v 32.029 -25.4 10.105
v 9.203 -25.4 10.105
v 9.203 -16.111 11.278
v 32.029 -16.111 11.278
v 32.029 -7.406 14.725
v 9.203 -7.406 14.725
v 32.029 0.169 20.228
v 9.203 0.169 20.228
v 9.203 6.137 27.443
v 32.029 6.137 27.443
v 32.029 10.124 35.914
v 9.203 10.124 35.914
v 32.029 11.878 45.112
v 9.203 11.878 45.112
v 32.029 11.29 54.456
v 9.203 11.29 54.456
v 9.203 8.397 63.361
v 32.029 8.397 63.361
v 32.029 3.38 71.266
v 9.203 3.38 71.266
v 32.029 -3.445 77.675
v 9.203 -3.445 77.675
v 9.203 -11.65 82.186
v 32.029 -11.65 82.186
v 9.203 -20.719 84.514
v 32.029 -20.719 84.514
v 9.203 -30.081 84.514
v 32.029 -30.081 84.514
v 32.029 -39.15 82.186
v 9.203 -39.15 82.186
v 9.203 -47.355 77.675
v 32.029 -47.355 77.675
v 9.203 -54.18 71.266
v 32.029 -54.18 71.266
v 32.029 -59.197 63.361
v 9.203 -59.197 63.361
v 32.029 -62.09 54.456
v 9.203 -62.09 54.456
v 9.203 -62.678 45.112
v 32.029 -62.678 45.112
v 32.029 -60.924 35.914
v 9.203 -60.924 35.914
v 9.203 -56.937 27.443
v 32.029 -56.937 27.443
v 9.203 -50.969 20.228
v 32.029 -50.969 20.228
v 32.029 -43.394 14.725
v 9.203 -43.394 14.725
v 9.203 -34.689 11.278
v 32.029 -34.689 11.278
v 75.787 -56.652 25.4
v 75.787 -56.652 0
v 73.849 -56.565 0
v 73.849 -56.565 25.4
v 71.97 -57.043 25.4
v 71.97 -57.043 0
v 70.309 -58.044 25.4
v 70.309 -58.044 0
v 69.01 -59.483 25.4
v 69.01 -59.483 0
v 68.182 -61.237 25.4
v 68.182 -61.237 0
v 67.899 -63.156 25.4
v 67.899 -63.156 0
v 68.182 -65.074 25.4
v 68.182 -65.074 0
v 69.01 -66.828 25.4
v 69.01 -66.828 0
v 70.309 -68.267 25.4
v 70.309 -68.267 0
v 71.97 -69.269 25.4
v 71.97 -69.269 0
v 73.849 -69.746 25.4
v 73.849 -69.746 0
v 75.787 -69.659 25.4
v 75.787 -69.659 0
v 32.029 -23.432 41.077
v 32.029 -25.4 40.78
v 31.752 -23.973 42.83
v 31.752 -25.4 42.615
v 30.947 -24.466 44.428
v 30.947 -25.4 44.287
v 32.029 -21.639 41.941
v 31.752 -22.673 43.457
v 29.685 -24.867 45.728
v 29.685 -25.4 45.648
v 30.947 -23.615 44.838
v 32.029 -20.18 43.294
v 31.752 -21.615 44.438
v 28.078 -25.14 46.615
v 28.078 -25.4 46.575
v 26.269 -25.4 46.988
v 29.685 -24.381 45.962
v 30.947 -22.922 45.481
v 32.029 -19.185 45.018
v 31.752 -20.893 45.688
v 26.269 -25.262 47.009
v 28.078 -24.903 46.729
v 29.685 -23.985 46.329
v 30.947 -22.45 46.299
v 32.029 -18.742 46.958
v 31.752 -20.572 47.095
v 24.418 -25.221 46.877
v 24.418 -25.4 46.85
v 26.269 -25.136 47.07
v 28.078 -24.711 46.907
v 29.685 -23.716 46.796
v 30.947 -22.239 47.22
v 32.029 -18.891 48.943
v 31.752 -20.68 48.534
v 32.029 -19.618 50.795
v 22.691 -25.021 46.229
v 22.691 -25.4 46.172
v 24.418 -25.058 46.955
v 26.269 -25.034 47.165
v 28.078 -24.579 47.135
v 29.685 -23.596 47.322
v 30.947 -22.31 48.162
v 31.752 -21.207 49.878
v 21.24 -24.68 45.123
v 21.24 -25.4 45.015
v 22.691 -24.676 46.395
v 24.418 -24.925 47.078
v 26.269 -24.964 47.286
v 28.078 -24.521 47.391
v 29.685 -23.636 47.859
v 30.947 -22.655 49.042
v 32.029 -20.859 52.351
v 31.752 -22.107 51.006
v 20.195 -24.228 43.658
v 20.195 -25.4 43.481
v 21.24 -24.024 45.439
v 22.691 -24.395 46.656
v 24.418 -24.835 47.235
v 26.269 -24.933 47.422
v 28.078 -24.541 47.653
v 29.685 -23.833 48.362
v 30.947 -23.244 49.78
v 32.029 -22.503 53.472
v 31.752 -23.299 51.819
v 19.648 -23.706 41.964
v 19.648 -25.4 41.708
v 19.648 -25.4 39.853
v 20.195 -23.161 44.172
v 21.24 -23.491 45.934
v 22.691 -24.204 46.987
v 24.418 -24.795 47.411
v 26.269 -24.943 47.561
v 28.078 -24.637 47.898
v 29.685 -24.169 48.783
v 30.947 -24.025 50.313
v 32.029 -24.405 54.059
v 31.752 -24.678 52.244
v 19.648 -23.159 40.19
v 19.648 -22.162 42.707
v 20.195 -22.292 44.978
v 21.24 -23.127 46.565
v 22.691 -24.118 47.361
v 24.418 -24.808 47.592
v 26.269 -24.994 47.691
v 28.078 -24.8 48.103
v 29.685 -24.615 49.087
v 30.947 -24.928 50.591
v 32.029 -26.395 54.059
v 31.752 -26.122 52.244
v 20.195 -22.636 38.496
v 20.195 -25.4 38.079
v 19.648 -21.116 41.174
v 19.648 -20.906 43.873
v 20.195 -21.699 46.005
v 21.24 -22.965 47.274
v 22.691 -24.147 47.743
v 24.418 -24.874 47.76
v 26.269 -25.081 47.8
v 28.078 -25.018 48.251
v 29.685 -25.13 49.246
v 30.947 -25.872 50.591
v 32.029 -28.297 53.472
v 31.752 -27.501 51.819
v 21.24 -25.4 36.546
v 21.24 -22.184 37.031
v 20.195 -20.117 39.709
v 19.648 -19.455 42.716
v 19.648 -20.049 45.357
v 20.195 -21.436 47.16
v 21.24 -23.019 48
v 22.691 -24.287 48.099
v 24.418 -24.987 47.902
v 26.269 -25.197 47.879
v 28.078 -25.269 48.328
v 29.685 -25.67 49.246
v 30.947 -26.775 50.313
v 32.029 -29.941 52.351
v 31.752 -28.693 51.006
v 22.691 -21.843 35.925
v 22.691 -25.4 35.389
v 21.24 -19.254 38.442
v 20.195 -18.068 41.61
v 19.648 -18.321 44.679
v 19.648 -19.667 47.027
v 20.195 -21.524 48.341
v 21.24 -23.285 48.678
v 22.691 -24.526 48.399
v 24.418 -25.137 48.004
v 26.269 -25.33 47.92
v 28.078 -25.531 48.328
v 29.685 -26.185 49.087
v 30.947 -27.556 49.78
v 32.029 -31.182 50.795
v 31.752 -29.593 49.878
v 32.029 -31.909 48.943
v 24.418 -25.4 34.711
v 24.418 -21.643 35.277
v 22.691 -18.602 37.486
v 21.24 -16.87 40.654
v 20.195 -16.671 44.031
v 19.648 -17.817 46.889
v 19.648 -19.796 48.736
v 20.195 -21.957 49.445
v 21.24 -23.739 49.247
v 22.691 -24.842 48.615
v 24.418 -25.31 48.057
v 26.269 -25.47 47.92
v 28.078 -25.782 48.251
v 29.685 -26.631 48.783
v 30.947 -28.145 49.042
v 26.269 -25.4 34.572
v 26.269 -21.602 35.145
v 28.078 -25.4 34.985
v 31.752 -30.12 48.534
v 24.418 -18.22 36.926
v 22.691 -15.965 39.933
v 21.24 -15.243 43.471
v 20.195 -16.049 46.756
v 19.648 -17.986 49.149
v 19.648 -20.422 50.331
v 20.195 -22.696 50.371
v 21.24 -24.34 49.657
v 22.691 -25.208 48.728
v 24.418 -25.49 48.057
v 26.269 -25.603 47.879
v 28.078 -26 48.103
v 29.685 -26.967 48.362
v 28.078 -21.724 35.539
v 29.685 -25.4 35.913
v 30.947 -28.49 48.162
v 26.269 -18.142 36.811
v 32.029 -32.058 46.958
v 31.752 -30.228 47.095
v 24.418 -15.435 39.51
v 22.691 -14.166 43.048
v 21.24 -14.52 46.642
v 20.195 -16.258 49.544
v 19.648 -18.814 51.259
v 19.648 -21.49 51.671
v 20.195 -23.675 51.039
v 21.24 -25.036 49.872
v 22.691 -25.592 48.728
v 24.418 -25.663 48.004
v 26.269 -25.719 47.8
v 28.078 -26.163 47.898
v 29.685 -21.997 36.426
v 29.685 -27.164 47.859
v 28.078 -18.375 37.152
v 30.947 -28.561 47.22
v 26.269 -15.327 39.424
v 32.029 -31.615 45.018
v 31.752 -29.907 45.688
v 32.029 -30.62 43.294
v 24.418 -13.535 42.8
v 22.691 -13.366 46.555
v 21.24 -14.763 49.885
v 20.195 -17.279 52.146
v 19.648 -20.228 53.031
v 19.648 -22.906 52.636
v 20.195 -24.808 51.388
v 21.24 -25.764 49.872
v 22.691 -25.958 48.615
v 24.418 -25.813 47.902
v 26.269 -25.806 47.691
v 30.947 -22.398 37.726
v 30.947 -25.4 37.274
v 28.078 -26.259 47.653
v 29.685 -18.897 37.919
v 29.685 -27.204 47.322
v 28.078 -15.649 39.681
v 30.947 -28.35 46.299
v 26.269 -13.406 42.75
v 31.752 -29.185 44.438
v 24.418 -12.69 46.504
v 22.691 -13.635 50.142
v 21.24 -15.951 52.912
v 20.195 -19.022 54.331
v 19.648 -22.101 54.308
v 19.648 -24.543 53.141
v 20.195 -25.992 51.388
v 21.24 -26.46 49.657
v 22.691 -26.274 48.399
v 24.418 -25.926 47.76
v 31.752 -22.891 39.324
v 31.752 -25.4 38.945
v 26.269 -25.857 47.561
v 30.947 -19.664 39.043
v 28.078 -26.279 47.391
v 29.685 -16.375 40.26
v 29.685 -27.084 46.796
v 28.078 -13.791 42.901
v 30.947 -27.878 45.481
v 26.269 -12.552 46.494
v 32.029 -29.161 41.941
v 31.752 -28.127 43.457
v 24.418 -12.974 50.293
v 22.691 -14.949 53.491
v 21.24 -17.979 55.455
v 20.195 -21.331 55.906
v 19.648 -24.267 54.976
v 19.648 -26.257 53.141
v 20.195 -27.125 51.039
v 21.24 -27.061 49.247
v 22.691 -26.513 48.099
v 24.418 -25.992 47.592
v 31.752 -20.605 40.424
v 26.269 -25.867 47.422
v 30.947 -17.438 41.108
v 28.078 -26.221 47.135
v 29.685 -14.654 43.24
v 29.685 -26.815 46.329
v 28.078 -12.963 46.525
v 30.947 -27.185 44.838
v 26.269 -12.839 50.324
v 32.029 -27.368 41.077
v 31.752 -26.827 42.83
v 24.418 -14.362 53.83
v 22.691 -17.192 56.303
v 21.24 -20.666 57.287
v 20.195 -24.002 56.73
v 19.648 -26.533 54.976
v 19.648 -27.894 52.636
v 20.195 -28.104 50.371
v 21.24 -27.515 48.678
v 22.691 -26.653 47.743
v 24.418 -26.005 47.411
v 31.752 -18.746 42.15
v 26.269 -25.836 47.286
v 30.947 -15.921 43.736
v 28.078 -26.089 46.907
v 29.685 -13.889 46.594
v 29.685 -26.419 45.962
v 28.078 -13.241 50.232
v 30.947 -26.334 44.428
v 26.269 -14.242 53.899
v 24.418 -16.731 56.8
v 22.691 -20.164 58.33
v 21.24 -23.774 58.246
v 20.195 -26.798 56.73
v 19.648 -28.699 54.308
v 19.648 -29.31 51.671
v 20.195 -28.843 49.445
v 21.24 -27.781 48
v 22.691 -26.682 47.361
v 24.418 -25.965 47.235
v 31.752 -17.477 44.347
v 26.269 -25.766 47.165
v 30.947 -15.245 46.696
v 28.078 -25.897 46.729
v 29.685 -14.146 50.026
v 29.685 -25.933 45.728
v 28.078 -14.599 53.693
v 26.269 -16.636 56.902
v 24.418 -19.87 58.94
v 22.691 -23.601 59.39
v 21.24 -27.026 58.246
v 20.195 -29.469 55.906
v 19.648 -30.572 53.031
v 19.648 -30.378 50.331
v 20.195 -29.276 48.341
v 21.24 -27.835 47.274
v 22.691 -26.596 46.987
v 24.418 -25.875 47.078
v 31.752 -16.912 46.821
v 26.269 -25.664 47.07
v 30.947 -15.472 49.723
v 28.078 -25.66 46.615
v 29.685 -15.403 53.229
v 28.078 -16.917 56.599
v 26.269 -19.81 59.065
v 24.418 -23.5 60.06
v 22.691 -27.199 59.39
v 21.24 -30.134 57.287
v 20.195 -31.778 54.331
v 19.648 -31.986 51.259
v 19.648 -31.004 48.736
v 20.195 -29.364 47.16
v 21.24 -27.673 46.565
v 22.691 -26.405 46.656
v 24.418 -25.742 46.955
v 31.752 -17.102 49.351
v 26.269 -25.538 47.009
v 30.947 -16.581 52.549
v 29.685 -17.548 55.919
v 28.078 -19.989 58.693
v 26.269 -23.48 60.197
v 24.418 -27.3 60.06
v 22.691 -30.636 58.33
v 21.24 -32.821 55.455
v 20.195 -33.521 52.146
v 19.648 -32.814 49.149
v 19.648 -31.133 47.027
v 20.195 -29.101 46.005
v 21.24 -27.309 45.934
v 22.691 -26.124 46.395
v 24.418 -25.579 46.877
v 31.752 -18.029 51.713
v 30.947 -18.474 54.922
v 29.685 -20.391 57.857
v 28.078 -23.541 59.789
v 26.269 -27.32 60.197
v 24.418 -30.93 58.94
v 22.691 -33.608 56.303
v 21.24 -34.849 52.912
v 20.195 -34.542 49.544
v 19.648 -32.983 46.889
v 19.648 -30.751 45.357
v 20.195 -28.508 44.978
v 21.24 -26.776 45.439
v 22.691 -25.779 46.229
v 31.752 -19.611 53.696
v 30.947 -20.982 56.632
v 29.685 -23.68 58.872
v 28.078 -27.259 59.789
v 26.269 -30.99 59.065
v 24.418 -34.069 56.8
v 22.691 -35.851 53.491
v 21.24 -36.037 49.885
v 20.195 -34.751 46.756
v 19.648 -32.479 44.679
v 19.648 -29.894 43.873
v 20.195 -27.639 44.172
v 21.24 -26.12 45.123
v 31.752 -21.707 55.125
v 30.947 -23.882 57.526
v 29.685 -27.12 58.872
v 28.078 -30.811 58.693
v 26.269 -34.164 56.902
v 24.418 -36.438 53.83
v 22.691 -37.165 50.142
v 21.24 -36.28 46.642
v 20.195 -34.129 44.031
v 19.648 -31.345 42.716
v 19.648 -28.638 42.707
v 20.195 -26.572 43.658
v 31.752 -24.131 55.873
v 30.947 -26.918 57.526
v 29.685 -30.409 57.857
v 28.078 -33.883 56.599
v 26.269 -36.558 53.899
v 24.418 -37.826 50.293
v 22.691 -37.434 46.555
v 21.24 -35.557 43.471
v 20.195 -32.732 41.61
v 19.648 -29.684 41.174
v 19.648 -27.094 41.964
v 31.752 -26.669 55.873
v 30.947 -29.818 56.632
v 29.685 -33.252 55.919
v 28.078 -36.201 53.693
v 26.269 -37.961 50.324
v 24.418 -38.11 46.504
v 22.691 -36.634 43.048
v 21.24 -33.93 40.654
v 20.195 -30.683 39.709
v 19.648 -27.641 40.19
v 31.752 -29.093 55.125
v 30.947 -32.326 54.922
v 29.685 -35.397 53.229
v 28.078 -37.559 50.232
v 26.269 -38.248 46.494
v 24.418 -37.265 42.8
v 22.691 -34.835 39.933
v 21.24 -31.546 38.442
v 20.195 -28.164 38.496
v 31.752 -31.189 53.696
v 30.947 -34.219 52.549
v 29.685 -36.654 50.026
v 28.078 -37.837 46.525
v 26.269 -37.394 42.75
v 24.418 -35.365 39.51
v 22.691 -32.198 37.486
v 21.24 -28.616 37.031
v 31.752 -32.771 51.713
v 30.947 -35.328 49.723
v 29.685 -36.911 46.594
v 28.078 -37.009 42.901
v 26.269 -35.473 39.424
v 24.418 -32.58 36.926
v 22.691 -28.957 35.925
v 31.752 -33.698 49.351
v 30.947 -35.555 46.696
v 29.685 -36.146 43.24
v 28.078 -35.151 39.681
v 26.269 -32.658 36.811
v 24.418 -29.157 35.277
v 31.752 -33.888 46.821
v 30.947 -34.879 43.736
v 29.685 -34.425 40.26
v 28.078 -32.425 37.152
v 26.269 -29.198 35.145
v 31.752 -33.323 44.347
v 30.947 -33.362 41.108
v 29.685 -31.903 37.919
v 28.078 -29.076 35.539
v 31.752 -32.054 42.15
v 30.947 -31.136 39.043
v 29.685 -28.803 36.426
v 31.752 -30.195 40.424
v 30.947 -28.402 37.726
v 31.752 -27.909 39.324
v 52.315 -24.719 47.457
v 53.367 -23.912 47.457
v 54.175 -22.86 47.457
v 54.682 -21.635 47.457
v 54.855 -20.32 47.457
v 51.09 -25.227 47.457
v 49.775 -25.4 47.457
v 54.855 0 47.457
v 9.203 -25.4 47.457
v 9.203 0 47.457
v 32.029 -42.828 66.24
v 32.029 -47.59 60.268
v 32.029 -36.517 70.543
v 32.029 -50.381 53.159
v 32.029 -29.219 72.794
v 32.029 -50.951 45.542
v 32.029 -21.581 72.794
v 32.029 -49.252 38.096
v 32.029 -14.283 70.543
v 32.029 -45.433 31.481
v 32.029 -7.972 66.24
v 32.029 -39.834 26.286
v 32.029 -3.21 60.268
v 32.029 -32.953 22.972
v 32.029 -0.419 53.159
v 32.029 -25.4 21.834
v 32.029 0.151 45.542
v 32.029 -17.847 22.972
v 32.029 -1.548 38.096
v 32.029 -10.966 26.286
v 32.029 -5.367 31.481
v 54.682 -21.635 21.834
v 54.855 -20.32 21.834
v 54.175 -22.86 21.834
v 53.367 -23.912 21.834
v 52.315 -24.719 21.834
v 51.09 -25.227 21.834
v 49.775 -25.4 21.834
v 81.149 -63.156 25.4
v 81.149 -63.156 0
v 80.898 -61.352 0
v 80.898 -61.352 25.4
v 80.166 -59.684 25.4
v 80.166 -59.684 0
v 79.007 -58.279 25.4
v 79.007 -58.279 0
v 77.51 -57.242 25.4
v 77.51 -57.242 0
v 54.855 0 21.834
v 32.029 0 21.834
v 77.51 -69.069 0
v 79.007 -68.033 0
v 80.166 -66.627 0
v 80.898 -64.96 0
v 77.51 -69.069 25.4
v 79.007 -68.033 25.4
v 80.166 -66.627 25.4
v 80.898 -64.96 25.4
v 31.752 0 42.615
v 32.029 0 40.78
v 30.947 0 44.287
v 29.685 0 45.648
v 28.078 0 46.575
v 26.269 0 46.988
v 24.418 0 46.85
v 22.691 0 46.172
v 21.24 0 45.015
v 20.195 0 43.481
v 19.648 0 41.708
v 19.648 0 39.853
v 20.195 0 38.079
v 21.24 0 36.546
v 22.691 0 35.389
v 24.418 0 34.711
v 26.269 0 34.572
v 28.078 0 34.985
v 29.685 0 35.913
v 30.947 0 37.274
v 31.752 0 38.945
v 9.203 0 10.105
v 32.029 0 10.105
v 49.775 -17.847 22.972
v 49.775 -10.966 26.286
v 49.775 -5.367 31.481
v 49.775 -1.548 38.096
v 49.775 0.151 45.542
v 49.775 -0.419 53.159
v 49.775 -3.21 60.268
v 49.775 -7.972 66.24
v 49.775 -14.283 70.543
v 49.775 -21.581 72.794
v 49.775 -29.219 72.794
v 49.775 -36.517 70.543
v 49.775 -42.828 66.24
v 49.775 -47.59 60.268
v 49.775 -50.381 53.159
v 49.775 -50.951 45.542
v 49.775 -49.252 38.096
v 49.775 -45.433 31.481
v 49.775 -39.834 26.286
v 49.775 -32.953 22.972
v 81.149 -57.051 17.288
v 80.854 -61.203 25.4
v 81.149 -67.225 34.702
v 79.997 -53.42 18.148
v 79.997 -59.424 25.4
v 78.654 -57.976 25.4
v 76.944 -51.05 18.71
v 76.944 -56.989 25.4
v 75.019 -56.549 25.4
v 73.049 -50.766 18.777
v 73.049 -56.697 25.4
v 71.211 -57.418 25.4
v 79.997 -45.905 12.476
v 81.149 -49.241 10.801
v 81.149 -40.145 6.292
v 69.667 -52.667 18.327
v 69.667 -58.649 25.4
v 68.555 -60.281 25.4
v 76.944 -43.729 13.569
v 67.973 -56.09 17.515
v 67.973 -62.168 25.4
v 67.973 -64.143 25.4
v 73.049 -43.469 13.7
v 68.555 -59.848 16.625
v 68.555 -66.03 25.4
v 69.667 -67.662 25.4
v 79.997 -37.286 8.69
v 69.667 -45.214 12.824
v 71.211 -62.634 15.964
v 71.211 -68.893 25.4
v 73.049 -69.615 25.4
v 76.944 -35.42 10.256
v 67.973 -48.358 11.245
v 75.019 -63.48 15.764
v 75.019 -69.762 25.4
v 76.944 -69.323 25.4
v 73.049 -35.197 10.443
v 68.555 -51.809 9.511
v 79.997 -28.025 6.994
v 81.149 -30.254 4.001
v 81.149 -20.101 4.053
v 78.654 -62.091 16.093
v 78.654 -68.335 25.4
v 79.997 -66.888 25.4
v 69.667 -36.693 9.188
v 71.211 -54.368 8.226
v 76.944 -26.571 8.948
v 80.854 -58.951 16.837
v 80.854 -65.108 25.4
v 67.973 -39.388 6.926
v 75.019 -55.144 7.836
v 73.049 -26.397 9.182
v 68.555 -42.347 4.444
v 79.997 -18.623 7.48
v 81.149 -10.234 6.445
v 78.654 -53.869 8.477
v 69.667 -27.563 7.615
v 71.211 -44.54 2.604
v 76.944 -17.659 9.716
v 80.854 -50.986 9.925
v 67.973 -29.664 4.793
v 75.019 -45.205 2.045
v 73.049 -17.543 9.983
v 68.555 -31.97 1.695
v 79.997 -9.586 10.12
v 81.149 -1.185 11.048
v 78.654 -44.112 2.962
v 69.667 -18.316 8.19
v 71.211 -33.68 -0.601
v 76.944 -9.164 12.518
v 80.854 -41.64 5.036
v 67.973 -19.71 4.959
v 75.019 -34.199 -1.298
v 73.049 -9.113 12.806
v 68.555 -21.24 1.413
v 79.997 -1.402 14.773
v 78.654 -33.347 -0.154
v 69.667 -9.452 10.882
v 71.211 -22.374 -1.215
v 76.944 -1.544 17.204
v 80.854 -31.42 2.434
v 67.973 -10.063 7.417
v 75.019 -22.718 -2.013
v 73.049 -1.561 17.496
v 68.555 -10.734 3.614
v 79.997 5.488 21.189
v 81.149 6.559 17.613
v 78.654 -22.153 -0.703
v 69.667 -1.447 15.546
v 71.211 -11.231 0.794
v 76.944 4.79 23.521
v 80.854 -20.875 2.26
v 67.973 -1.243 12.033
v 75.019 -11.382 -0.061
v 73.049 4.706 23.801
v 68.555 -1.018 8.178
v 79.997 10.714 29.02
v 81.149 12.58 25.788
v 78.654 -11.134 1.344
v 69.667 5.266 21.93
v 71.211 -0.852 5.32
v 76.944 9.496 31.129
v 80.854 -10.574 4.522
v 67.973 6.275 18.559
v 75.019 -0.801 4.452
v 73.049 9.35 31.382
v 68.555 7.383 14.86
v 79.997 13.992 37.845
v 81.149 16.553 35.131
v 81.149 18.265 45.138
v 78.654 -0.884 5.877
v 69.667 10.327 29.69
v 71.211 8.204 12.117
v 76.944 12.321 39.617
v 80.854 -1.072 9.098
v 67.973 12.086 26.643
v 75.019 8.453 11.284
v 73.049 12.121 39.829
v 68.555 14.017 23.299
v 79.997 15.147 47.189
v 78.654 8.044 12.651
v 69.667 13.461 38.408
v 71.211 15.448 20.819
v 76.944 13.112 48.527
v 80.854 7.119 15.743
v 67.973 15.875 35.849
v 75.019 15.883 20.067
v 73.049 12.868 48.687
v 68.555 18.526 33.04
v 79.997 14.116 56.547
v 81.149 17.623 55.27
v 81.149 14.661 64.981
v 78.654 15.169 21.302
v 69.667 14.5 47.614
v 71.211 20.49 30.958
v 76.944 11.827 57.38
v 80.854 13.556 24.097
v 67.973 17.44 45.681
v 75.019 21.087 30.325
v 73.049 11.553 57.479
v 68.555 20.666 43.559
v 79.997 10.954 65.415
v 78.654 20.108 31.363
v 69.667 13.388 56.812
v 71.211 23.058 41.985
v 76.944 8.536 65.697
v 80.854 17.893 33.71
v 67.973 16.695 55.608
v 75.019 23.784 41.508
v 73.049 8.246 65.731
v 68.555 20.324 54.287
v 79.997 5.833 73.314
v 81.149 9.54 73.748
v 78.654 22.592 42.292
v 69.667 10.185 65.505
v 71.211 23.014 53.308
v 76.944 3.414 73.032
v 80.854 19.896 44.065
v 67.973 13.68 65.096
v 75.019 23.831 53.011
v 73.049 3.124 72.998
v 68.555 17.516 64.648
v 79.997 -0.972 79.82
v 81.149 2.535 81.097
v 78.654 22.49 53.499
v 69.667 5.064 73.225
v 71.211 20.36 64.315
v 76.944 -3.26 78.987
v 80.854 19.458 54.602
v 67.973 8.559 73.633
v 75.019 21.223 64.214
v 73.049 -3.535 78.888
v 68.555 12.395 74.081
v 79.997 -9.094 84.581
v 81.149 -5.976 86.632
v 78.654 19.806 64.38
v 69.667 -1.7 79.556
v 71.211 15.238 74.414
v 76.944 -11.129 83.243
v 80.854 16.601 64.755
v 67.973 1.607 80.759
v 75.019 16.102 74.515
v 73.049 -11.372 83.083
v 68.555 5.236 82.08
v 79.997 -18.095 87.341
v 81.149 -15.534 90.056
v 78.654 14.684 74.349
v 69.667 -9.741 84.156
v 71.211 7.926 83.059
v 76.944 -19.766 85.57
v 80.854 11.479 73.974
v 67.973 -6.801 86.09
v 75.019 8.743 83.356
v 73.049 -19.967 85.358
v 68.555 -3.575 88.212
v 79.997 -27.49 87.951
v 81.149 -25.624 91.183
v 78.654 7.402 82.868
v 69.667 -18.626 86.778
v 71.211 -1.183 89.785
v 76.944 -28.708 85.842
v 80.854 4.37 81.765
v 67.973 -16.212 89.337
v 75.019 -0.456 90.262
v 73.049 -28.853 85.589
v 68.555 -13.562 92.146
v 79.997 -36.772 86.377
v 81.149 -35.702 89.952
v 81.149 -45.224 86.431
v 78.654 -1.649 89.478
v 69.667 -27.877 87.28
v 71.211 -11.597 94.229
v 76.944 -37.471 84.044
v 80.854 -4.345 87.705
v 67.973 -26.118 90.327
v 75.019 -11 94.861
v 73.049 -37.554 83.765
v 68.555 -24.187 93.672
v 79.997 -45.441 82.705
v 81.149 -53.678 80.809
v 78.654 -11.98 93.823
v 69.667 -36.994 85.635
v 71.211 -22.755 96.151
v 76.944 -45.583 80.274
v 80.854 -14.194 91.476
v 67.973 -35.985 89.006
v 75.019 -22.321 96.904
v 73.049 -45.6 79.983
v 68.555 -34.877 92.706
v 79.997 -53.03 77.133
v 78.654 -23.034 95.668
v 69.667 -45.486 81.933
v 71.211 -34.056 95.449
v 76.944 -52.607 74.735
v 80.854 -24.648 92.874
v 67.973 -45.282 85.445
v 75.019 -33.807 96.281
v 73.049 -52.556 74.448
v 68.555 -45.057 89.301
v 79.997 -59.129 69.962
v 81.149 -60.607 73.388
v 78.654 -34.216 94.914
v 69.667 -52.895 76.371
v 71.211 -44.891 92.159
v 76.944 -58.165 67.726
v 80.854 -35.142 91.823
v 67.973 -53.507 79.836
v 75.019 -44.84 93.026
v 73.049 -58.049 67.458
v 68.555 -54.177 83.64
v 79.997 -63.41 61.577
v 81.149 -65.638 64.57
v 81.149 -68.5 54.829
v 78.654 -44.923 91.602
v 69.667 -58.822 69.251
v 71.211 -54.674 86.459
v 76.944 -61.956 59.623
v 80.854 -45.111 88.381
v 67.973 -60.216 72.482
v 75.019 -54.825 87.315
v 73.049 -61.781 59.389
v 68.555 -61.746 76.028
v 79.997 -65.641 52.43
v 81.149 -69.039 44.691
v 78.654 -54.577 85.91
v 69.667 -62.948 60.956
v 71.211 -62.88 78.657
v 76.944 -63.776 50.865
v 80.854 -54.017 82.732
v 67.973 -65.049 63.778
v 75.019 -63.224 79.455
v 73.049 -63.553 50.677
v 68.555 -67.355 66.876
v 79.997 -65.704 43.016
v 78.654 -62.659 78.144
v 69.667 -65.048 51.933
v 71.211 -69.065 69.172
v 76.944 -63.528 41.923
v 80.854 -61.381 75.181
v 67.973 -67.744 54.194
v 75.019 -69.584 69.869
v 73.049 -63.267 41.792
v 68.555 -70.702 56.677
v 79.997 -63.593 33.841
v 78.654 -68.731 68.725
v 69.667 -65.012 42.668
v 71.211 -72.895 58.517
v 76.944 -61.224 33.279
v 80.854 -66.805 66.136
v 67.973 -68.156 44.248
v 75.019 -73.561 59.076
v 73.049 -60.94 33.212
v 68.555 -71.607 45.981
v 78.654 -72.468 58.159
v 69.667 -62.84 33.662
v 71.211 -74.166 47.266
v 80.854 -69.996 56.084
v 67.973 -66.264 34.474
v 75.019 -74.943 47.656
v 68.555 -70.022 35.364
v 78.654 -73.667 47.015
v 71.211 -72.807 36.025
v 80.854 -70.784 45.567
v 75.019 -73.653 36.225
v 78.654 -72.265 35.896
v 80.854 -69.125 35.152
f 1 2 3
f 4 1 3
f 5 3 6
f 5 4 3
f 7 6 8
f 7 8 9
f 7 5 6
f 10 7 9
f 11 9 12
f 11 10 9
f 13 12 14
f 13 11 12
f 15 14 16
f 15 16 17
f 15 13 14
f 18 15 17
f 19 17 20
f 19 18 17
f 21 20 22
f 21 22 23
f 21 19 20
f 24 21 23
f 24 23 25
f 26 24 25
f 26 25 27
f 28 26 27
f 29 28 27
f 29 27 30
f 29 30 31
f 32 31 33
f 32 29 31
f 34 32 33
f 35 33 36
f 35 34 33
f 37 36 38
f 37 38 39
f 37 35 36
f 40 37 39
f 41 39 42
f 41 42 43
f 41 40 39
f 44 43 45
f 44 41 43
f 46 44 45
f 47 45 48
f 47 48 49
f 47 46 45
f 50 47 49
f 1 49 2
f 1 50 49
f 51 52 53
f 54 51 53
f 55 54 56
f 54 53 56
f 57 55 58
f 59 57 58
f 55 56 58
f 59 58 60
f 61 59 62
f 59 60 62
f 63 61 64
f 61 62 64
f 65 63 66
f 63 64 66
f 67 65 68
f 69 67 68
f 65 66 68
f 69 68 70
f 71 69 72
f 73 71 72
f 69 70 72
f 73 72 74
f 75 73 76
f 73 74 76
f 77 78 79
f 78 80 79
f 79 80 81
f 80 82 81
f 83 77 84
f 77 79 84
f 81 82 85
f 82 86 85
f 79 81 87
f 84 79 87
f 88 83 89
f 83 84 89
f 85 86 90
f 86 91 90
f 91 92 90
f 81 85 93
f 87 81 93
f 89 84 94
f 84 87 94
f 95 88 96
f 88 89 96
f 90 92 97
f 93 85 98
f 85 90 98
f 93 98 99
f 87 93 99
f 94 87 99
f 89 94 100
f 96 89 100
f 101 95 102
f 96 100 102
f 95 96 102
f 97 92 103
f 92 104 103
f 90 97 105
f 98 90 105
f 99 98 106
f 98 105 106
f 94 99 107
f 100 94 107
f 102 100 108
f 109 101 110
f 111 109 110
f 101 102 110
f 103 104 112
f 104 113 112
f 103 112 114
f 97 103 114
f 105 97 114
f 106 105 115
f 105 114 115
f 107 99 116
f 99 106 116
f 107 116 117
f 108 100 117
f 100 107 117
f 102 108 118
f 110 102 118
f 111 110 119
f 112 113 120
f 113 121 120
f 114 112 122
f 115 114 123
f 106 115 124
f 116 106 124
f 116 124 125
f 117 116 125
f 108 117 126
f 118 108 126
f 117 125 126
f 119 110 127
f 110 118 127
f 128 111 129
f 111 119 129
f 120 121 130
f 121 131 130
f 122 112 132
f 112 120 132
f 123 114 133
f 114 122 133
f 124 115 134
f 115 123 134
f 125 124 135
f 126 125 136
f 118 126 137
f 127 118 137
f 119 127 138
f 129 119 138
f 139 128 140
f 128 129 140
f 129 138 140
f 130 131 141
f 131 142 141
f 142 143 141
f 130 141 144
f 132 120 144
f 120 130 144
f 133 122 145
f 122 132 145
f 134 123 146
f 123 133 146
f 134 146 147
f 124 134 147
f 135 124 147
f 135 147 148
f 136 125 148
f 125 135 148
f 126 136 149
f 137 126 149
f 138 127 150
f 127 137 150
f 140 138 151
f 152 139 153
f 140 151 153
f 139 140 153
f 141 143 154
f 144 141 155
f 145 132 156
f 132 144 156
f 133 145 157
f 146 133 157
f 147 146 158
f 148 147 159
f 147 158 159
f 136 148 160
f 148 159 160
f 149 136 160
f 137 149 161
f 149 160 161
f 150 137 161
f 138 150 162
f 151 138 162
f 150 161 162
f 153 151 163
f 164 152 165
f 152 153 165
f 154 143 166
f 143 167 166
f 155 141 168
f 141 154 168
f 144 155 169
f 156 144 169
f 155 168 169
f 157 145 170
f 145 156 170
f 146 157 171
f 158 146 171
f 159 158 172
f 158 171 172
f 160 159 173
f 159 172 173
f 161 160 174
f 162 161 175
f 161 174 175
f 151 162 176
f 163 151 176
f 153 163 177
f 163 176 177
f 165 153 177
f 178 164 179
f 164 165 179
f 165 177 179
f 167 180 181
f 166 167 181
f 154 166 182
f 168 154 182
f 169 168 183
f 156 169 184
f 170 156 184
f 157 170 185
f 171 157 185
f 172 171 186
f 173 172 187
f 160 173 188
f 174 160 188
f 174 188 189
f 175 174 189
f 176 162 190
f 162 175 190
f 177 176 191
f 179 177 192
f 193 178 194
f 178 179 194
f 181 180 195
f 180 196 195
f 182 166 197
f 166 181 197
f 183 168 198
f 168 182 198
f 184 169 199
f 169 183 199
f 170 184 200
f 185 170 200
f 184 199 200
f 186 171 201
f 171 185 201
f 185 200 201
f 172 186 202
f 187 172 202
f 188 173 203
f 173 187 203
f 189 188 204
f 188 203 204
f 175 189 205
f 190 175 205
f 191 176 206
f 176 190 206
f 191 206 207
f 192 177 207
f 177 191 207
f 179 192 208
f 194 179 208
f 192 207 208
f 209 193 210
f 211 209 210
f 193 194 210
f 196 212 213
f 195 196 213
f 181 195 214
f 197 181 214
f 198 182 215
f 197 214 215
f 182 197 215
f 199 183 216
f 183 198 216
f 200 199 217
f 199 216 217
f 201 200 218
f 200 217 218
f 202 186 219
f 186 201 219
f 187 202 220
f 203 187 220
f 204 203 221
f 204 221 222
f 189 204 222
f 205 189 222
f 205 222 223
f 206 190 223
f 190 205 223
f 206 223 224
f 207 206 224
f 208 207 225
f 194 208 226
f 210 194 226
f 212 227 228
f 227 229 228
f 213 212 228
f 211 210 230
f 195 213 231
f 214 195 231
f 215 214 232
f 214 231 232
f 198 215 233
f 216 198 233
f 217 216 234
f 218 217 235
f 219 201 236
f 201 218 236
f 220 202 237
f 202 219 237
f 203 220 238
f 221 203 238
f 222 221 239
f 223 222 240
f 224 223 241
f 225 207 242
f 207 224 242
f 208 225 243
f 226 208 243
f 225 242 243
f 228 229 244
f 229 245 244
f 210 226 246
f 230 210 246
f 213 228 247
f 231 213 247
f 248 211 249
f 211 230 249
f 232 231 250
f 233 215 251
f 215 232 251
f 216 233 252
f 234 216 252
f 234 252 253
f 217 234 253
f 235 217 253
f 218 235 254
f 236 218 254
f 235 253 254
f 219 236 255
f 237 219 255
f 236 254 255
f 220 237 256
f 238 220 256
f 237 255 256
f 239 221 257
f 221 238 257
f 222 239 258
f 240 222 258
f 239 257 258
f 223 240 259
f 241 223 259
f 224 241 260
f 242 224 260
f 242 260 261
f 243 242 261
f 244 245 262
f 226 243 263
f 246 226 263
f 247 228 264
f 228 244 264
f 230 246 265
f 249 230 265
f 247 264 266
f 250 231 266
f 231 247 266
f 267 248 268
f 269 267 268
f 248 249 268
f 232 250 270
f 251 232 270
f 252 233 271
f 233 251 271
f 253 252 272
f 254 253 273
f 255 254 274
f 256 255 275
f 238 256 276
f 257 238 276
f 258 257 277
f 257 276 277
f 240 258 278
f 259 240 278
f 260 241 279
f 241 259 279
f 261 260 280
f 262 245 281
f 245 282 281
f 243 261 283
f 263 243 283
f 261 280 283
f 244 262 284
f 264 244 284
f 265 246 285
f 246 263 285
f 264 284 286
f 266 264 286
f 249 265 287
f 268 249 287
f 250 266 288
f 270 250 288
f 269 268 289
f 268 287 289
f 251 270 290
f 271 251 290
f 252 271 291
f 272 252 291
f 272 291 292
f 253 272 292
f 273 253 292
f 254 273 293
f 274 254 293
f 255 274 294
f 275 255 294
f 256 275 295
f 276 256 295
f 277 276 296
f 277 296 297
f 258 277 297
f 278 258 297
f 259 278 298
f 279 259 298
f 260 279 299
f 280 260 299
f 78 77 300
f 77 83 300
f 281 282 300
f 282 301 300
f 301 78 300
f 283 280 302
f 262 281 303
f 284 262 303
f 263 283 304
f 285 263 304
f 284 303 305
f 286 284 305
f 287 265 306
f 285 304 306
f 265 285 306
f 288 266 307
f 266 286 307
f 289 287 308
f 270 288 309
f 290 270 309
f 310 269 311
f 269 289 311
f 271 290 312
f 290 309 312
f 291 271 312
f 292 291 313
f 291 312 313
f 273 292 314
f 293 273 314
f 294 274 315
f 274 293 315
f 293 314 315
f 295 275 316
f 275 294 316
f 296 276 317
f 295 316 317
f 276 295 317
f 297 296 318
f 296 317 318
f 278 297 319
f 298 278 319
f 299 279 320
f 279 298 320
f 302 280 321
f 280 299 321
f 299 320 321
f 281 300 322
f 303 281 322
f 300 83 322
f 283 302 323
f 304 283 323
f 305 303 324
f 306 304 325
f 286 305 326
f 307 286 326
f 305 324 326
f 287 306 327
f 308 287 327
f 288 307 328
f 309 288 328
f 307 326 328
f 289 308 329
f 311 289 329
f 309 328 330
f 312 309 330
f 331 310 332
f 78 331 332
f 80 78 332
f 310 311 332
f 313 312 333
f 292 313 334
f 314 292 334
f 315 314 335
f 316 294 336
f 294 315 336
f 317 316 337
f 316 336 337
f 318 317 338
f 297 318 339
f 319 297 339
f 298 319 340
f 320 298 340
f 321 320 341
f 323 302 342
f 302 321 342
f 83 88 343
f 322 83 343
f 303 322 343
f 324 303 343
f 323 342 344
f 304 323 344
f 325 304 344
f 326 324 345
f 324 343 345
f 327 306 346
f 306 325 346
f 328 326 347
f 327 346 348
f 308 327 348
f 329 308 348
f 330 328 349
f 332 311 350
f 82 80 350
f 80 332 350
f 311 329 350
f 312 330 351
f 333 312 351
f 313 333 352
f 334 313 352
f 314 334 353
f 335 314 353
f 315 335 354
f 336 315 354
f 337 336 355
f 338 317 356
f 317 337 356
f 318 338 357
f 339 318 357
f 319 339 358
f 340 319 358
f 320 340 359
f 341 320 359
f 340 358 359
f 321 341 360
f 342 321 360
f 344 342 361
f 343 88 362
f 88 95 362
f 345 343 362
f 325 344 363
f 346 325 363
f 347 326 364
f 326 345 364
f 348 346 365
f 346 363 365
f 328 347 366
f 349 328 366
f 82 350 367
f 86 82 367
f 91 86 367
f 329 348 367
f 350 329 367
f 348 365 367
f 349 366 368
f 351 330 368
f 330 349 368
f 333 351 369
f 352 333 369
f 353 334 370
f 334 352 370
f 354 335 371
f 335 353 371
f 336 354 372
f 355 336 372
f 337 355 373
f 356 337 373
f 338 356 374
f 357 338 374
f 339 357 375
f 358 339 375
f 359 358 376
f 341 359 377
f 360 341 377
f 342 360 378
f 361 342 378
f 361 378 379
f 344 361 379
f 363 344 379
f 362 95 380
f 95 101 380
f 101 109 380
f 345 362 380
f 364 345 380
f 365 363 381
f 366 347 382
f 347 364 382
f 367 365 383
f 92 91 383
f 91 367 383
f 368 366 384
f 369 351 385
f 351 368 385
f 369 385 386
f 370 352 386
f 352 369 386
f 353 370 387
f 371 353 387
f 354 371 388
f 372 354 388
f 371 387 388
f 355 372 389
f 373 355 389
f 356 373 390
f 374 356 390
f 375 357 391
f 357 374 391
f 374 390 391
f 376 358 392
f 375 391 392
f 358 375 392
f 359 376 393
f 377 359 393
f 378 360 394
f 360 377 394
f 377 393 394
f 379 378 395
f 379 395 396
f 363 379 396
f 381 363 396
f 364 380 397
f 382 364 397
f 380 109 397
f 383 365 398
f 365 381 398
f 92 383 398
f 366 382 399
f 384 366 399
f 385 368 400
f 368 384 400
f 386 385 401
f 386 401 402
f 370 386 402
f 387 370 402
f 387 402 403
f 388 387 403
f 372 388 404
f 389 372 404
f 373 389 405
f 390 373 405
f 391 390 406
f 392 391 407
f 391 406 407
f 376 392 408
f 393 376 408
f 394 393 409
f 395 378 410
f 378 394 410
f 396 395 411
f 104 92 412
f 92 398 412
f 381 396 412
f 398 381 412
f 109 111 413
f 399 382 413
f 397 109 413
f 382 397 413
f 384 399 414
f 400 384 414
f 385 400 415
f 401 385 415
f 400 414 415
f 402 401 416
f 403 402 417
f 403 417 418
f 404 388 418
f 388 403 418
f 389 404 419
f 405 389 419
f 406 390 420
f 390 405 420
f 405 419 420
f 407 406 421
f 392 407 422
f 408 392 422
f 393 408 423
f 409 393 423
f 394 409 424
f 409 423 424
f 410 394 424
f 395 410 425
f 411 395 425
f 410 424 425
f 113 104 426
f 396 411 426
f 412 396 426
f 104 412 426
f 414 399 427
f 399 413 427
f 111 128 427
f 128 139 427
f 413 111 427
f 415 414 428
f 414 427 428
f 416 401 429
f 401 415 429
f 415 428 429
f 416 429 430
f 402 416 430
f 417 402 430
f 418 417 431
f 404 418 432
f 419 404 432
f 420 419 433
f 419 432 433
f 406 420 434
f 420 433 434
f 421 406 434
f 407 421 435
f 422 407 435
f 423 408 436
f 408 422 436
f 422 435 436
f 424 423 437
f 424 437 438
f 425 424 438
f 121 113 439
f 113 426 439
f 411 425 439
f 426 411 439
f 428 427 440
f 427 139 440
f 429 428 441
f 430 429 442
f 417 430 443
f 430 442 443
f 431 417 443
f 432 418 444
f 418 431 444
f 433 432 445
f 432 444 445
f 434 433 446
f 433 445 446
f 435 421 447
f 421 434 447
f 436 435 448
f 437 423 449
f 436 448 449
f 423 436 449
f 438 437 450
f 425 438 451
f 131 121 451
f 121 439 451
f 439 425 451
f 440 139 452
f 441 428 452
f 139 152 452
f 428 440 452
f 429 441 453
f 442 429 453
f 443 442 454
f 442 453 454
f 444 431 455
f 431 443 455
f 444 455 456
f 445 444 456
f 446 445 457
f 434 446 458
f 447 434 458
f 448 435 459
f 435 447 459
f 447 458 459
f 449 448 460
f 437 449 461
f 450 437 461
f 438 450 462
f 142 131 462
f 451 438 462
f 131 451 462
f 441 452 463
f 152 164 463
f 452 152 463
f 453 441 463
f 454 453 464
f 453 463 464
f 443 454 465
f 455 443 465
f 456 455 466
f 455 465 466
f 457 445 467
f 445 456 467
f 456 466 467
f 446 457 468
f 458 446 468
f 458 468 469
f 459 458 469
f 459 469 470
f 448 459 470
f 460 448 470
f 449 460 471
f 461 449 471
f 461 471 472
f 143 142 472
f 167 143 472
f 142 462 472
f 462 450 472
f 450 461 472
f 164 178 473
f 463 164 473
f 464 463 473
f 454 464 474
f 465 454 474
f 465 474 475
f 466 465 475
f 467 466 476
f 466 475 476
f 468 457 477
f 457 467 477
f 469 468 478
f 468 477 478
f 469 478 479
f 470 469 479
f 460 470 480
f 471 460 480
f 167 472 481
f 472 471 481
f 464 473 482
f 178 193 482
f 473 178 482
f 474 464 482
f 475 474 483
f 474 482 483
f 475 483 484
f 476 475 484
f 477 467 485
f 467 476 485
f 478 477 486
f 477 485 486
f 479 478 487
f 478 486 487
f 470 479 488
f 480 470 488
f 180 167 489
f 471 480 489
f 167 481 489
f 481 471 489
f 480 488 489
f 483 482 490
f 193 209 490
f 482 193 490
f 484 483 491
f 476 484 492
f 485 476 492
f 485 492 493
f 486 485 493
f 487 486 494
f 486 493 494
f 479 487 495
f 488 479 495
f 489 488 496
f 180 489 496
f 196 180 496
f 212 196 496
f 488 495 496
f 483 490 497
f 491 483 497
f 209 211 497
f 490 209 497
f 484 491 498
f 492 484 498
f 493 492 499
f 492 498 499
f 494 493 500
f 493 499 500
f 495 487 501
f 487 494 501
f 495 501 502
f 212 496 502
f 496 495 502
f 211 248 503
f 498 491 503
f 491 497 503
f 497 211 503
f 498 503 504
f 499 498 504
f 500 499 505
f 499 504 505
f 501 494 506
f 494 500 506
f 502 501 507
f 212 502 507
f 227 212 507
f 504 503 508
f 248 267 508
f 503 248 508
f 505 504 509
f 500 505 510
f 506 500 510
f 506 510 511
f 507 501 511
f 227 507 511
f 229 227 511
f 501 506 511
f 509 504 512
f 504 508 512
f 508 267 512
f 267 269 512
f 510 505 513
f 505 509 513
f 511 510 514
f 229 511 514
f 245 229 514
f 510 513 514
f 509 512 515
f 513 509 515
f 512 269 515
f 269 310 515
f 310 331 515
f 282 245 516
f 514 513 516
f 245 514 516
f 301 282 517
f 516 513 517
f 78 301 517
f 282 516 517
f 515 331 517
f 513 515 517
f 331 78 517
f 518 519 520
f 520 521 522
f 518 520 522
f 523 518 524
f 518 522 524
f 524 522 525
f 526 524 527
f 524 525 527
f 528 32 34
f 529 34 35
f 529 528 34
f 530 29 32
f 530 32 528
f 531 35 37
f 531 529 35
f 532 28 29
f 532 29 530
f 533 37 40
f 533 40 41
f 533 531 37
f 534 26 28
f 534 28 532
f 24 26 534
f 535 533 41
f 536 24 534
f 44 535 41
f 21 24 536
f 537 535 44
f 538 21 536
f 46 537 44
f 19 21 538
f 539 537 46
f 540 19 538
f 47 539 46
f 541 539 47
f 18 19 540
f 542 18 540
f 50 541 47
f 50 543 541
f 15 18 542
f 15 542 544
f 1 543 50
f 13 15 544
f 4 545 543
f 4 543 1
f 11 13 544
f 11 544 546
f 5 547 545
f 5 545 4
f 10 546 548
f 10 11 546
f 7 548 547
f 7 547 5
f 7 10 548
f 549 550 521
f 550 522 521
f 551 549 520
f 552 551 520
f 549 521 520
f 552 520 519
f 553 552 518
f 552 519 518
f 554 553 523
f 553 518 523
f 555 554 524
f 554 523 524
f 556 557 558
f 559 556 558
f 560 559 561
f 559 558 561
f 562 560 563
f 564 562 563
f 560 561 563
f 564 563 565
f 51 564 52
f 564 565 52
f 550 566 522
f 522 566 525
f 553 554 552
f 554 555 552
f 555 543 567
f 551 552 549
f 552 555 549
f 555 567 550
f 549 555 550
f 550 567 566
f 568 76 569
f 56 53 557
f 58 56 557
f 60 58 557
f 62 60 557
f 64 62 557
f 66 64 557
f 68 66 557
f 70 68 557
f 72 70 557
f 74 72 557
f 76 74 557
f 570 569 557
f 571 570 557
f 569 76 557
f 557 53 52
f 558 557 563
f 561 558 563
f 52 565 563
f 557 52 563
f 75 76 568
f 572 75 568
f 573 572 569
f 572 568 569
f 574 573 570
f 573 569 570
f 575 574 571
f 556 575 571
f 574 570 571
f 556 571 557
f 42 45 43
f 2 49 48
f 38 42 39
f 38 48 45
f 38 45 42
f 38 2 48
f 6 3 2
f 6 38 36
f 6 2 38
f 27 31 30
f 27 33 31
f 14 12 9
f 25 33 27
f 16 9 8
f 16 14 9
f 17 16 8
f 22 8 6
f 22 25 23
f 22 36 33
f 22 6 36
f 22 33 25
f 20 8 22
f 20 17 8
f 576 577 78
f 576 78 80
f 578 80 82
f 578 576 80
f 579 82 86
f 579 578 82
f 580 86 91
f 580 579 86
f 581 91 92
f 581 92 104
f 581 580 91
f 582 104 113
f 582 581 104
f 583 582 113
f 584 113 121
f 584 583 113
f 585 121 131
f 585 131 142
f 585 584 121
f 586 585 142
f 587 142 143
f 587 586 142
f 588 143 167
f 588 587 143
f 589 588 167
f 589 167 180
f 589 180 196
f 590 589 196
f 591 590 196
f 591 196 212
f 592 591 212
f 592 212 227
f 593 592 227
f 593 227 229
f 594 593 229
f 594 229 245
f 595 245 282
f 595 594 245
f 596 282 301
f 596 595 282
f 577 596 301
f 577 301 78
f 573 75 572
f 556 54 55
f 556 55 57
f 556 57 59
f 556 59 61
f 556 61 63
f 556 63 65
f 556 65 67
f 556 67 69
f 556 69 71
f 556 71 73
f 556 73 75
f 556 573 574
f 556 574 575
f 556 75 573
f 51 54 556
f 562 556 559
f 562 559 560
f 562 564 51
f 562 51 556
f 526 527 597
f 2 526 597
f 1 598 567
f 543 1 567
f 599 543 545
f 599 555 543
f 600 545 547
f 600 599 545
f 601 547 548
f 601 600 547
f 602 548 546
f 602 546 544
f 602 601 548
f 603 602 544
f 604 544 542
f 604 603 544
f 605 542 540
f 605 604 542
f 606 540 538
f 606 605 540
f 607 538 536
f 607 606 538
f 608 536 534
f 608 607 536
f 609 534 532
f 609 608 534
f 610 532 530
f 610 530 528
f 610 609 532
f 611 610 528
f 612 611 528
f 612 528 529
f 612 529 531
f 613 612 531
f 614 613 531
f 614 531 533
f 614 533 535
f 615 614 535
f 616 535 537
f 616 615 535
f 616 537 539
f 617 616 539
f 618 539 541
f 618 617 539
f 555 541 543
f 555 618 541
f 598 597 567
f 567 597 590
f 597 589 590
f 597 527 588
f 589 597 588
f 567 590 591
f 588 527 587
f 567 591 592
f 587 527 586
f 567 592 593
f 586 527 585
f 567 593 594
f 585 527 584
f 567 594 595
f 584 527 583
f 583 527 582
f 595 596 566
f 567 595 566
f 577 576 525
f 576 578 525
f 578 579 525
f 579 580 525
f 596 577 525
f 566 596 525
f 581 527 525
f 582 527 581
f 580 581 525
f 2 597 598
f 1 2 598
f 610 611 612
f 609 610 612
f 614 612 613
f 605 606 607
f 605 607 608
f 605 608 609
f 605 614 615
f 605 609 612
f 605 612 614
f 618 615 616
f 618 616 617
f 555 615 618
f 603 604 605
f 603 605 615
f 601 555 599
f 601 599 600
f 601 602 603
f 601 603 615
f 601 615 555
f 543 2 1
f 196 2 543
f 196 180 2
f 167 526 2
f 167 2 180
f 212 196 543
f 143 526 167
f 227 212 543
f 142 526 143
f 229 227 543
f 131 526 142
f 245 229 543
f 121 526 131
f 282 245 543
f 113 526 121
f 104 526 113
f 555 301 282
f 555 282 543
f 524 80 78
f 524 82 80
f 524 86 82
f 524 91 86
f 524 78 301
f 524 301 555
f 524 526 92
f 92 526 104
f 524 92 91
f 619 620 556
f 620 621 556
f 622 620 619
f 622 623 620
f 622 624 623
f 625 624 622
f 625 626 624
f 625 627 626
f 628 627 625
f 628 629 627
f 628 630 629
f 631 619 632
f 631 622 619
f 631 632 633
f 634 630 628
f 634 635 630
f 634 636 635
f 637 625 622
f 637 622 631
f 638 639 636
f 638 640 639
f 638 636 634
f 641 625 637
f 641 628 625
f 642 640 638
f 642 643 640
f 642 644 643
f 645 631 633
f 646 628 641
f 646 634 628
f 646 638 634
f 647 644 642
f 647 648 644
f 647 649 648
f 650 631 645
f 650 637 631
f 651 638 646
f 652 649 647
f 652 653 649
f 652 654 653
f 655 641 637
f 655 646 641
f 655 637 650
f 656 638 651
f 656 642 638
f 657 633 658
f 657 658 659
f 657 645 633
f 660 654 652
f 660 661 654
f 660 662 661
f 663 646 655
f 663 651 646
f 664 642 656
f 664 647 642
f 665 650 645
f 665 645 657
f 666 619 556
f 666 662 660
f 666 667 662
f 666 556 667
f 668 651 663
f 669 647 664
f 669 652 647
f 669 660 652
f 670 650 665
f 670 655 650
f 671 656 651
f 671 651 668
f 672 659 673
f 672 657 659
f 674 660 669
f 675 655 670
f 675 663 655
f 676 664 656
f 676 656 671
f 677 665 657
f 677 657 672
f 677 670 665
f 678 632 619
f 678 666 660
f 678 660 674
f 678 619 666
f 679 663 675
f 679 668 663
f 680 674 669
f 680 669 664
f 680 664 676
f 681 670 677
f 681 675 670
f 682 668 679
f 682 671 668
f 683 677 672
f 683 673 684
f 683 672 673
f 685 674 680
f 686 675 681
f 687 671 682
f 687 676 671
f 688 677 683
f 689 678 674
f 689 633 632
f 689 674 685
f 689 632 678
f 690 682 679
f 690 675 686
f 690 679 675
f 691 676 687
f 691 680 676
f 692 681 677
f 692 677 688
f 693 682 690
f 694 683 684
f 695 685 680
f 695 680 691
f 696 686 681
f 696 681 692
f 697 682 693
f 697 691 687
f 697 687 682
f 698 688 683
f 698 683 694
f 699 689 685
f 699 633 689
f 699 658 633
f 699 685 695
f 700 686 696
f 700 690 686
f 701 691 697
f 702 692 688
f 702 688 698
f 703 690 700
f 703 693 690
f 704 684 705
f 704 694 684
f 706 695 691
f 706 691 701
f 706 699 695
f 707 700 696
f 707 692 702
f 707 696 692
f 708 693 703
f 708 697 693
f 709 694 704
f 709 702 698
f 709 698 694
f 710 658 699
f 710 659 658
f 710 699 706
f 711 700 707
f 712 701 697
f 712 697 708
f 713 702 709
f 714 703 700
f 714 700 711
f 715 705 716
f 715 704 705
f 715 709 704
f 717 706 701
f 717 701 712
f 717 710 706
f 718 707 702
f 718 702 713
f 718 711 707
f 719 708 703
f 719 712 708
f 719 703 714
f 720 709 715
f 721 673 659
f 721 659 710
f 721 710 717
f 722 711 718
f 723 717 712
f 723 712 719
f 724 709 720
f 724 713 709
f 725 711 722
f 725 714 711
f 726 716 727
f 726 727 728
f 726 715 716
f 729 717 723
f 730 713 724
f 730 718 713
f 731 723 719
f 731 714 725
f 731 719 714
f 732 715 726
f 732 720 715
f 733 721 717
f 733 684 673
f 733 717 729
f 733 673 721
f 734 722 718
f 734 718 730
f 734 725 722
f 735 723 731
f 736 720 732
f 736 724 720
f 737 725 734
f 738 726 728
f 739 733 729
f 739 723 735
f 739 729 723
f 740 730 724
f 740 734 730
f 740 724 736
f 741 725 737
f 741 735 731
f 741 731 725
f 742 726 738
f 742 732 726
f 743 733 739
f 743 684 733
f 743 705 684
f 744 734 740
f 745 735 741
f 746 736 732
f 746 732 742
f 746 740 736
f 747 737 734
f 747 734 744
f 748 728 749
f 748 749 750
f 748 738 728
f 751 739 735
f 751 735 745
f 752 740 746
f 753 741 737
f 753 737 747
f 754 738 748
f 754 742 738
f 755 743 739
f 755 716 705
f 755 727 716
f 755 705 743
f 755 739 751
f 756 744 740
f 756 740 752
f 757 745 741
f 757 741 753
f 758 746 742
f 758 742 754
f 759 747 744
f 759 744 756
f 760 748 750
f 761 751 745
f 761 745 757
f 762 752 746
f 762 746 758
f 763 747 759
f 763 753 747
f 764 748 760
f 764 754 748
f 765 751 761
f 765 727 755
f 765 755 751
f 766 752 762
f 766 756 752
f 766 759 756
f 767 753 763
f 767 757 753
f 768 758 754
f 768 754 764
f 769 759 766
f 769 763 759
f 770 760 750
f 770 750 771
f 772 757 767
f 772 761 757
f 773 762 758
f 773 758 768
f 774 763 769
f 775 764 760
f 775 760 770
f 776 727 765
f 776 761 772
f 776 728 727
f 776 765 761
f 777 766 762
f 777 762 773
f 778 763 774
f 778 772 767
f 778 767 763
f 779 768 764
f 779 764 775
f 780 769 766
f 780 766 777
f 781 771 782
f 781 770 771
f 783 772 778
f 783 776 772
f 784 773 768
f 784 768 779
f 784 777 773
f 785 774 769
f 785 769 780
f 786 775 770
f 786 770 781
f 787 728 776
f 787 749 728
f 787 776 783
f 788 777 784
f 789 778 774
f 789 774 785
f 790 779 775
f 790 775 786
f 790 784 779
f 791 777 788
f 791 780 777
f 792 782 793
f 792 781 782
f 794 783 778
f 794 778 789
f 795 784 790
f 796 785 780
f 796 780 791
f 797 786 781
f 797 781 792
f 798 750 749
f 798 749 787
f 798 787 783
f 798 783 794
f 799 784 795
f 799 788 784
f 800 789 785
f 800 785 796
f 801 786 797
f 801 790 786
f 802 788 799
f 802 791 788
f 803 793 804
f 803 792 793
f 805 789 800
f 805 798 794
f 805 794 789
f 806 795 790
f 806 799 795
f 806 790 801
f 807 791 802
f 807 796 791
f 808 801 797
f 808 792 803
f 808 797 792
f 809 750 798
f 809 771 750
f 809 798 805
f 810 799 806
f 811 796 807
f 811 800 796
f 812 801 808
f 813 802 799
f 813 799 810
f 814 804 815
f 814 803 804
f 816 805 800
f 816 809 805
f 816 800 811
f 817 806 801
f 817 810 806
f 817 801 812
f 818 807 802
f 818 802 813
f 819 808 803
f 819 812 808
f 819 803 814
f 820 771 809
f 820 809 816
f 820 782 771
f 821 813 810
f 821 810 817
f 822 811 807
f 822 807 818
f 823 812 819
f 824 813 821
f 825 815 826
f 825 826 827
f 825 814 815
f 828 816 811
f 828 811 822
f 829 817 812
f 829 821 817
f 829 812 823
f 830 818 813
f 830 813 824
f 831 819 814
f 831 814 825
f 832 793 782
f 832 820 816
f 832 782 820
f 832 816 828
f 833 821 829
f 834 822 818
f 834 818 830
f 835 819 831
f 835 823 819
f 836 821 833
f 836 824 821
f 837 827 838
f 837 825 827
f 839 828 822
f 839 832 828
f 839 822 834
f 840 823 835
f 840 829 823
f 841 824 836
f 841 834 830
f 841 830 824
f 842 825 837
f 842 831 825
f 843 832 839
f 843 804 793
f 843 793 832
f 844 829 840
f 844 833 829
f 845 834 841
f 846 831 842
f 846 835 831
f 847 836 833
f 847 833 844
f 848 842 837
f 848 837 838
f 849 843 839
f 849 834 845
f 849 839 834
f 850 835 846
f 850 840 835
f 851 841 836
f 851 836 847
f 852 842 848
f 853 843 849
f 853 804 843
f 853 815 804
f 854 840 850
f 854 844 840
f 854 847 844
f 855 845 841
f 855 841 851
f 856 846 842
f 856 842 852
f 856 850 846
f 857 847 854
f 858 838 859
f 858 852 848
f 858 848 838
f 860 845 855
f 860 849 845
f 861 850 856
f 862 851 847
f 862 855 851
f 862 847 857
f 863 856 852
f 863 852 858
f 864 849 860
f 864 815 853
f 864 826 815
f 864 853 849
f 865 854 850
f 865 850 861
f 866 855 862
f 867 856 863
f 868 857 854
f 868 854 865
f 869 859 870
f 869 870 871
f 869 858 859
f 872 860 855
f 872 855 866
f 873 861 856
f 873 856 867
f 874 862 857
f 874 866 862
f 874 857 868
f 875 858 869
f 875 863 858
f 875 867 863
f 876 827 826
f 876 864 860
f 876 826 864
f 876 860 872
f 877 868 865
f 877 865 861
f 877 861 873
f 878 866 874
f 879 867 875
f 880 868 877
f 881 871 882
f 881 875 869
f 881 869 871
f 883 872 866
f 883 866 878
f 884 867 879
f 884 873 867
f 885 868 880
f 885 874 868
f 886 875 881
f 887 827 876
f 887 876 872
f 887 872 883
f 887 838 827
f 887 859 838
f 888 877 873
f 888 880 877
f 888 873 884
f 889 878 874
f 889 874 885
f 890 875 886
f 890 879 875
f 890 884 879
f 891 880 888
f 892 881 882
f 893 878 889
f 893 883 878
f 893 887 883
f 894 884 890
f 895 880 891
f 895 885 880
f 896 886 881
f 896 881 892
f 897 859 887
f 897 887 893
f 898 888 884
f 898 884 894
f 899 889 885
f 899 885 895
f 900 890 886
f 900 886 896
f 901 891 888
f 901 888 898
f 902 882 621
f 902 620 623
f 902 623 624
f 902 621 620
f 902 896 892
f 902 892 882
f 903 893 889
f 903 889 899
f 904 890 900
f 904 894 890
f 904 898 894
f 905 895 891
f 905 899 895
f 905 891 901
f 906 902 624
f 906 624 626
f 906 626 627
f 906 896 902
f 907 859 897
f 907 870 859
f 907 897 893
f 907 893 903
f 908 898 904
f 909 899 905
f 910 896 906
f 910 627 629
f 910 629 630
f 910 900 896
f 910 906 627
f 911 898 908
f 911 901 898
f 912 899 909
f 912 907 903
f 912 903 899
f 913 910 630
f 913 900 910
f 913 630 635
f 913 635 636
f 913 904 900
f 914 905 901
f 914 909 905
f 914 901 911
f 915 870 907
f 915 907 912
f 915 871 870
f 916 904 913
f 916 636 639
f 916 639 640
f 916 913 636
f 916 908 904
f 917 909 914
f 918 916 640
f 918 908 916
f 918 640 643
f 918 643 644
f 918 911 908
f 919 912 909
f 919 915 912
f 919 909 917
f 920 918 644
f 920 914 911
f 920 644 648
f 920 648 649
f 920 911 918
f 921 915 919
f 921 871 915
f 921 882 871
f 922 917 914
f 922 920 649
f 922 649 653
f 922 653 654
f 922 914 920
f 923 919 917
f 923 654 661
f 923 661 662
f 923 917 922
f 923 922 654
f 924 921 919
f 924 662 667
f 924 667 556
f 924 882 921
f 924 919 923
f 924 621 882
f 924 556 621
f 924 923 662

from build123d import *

# Parameters (mm, degrees)
F0_R      = 6.2253326178
F0_W      = 22.8262245655
F0_H      = 11.7288976908
F1_DEPTH  = 25.4
F3_R      = 5.08
F4_DEPTH  = 25.4
F4_FACE_R = 6.625041603
F1_FACE_R = 6.2253326178


with BuildPart() as f1:
    # F0 (on Front) → F1 (new body)
    with BuildSketch(Plane.XZ):
        Polygon((9.2026740313, 47.4568679929), (9.2026740313, 21.8337476254), (32.0288985968, 21.8337476254), (54.8551231623, 21.8337476254), (54.8551231623, 47.4568679929), align=None)
        with Locations((25.803565979, 40.7804250717)):
            Circle(F0_R, mode=Mode.SUBTRACT)
        with Locations((20.615786314, 15.96929878)):
            Rectangle(F0_W, F0_H)
    extrude(amount=F1_DEPTH)

    # F3
    f3_edges = [f1.edges().sort_by_distance(p)[0] for p in [
        (54.855123, -25.4, 34.645308),
    ]]
    fillet(f3_edges, radius=F3_R)


with BuildPart() as f4:
    # F2 (on Top) → F4 (new body)
    with BuildSketch(Plane.XY):
        with BuildLine():
            ThreePointArc((75.7866948843, -56.6520751508), (67.8985414516, -63.1555914879), (75.7866948843, -69.659107825))
            Line((75.7866948843, -69.659107825), (75.7866948843, -56.6520751508))
        make_face()
        with BuildLine():
            Line((75.7866948843, -56.6520751508), (75.7866948843, -69.659107825))
            ThreePointArc((75.7866948843, -69.659107825), (79.6353021716, -67.3700314163), (81.1486246575, -63.1555914879))
            ThreePointArc((81.1486246575, -63.1555914879), (79.6353021716, -58.9411515595), (75.7866948843, -56.6520751508))
        make_face()
    extrude(amount=F4_DEPTH)


with BuildPart() as f5:
    # F4_face (on face) + F1_face (on face) → F5 (revolve)
    with BuildSketch(Plane(origin=(74.5235830545, -63.1555914879, 25.4), x_dir=(1, 0, 0), z_dir=(0, 0, 1))):
        Circle(F4_FACE_R)
    with BuildSketch(Plane(origin=(27.8636251422, -25.4, 29.7978212865), x_dir=(1, 0, 0), z_dir=(0, -1, 0))):
        Polygon((4.1652734545, -7.9640736611), (21.91149802, -7.9640736611), (21.91149802, 17.6590467064), (-18.660951111, 17.6590467064), (-18.660951111, -19.6929713519), (4.1652734545, -19.6929713519), align=None)
        with Locations((-2.0600591632, 10.9826037853)):
            Circle(F1_FACE_R, mode=Mode.SUBTRACT)
    revolve(axis=Axis((29.4888985968, -25.4, 47.4568679929), (1, 0, 0)))


solid = Compound([f1.part, f4.part, f5.part])
